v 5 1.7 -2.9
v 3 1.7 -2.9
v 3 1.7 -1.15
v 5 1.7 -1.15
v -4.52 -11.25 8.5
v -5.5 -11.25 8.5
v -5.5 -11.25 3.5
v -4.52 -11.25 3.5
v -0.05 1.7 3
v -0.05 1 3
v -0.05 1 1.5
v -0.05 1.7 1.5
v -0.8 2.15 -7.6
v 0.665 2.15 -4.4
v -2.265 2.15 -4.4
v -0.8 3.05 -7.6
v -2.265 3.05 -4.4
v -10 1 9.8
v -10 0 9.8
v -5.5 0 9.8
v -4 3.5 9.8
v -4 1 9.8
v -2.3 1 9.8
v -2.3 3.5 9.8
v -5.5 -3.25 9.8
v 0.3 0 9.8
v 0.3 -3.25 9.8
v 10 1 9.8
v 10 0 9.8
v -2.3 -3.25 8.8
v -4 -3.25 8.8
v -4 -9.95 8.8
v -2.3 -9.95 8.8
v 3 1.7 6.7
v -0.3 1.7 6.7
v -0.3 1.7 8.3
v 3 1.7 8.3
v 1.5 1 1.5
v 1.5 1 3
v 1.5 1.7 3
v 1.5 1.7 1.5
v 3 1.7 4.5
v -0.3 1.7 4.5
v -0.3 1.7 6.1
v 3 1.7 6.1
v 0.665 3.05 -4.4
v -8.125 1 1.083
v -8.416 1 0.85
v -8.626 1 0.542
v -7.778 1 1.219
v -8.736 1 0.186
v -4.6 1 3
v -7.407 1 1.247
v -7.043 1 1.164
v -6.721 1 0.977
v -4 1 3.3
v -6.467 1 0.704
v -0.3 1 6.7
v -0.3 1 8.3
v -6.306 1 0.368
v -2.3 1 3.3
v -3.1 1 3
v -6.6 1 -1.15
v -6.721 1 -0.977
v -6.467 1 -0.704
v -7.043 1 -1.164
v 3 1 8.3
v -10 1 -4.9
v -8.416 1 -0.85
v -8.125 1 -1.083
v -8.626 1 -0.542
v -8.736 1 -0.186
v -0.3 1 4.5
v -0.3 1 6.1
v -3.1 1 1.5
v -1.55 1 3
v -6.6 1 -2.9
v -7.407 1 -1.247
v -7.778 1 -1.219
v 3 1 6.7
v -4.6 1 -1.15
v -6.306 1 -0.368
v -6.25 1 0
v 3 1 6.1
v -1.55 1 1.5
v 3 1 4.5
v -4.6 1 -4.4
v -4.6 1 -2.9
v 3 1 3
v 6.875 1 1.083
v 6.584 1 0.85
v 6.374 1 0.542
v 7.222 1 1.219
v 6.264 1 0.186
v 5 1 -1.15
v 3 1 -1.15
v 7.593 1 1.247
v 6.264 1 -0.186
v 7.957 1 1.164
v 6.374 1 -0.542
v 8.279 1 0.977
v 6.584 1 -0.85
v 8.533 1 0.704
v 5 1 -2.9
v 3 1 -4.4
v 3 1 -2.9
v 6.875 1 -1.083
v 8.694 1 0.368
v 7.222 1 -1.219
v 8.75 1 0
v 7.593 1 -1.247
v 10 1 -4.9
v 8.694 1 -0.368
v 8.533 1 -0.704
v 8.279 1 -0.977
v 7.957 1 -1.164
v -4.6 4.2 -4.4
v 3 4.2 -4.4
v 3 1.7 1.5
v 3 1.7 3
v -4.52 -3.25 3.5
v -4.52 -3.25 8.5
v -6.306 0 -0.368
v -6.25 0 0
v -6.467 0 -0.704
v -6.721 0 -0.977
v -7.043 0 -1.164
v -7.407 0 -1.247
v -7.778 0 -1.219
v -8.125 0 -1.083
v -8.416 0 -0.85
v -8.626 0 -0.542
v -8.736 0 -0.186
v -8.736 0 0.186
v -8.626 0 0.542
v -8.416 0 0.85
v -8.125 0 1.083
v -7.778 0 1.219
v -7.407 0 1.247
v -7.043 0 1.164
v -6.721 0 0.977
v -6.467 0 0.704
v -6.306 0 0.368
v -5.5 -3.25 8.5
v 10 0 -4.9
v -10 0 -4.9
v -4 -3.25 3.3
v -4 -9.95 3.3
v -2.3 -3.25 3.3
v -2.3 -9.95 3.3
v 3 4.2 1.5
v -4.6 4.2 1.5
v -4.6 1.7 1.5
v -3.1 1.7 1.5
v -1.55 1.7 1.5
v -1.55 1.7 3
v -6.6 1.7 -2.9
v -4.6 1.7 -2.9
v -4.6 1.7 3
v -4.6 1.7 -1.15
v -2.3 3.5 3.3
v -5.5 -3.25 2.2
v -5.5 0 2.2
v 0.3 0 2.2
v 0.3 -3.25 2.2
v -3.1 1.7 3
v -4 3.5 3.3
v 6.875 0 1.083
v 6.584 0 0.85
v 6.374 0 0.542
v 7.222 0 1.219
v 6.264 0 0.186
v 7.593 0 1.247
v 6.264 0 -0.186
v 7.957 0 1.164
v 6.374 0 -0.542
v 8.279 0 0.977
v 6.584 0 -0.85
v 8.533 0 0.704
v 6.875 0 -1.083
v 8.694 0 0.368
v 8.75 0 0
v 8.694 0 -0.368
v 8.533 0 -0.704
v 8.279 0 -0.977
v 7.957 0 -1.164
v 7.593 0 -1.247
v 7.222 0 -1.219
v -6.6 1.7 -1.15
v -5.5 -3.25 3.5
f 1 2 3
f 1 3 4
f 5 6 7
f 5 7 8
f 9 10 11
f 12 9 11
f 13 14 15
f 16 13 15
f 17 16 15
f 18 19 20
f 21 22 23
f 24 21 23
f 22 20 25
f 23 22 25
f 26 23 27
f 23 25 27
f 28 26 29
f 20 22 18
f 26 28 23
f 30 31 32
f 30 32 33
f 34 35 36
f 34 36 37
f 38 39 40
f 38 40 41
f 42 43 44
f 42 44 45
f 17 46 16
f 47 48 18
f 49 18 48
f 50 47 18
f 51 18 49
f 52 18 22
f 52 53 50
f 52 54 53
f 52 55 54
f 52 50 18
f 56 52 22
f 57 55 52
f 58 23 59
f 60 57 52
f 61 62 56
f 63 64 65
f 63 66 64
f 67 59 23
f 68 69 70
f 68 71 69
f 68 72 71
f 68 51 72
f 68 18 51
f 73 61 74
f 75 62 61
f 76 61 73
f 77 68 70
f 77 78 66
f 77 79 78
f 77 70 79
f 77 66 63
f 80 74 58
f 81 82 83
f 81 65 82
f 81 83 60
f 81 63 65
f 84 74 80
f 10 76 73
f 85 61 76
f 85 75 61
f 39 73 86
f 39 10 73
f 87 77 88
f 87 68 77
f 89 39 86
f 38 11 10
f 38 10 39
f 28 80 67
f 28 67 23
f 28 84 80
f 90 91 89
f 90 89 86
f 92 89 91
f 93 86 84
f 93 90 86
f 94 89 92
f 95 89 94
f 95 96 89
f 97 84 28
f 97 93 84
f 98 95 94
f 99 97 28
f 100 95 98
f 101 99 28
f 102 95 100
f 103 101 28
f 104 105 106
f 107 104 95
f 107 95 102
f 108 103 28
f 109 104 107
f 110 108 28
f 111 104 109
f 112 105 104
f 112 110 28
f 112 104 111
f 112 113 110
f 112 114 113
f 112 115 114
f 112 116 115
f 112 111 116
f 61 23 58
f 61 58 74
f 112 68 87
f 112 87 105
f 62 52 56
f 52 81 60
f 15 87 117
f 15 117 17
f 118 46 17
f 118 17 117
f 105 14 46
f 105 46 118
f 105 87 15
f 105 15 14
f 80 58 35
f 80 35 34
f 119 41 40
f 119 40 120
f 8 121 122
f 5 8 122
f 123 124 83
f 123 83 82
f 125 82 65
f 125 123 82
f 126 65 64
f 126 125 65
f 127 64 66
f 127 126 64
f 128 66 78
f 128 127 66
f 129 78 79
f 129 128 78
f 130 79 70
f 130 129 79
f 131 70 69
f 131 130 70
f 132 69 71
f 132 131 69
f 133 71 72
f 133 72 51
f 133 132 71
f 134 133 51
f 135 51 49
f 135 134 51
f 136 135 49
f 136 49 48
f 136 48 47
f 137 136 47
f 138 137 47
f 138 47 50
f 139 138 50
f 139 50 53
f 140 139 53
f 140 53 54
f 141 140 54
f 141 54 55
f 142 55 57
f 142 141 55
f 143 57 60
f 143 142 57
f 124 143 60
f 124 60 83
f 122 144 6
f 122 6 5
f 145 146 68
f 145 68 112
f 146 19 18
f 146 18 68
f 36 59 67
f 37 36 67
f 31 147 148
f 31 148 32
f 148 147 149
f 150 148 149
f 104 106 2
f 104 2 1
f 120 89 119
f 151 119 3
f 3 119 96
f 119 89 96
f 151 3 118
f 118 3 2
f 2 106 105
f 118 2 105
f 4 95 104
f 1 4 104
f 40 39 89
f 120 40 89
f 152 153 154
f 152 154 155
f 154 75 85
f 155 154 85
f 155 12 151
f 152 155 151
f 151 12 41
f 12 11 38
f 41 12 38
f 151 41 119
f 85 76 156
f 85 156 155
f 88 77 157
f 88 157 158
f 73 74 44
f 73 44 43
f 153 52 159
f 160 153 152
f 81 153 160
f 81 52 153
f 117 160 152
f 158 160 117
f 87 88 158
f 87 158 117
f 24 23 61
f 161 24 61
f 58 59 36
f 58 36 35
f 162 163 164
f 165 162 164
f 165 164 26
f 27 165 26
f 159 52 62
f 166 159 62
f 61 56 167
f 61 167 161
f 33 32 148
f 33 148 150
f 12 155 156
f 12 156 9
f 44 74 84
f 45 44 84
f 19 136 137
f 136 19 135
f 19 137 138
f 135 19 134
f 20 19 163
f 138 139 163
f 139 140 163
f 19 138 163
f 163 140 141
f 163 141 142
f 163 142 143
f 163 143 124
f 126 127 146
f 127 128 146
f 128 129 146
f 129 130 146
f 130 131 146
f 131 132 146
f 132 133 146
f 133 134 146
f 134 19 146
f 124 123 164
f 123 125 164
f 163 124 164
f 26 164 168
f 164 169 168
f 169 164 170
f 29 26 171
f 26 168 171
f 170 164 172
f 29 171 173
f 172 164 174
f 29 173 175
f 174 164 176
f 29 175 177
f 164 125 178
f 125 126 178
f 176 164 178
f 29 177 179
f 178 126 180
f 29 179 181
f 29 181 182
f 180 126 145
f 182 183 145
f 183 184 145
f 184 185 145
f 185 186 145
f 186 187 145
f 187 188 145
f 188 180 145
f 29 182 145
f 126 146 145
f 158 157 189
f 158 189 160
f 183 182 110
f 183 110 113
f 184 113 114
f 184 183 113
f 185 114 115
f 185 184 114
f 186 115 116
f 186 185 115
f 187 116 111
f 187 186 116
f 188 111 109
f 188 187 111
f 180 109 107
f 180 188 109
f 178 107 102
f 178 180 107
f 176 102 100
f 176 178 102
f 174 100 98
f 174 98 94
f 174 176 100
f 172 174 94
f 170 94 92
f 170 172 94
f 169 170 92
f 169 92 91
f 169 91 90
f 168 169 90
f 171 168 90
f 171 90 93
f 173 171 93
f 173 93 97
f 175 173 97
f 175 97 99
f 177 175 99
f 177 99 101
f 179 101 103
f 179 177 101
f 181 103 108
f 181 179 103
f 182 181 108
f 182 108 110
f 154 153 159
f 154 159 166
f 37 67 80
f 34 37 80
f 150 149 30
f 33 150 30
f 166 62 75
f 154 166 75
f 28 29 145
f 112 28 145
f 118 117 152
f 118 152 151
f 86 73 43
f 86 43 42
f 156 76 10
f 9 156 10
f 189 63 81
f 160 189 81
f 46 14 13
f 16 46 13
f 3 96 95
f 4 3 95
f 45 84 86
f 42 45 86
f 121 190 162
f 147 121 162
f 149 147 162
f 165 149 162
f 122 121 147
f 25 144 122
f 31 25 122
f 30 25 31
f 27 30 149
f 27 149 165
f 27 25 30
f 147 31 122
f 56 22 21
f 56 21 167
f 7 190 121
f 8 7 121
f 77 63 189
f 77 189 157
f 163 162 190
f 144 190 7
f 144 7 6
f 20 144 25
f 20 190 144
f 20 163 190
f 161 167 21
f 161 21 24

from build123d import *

# Parameters (mm, degrees)
SKETCH_1_W          = 20
SKETCH_1_H          = 14.7
SKETCH_1_R          = 1.25
EXTRUDE_1_DEPTH     = 1
SKETCH_2_W          = 7.6
SKETCH_2_H          = 5.9
EXTRUDE_2_DEPTH     = 3.2
SKETCH_3_W          = 2.93
SKETCH_3_H          = 0.9
EXTRUDE_3_DEPTH     = 3.2
CUT_EXTRUDE_START   = -0.9
CUT_EXTRUDE_1_DEPTH = 0.9
SKETCH_5_W          = 2
SKETCH_5_H          = 1.75
SKETCH_5_W_2        = 1.5
SKETCH_5_H_2        = 1.5
SKETCH_5_W_3        = 3.3
SKETCH_5_H_3        = 1.6
EXTRUDE_4_DEPTH     = 0.7
SKETCH_6_W          = 1.7
SKETCH_6_H          = 6.5
EXTRUDE_5_DEPTH     = 2.5
SKETCH_7_W          = 5.8
SKETCH_7_H          = 7.6
EXTRUDE_6_DEPTH     = 3.25
SKETCH_8_W          = 0.98
SKETCH_8_H          = 5
EXTRUDE_7_DEPTH     = 8
SKETCH_9_W          = 1.7
SKETCH_9_H          = 5.5
EXTRUDE_8_DEPTH     = 6.7


with BuildPart() as part:
    # 草图1 → 凸台-拉伸1 (new body)
    with BuildSketch(Plane(origin=(0, 0, 0), x_dir=(1, 0, 0), z_dir=(0, 1, 0))):
        with Locations((0, -2.45)):
            Rectangle(SKETCH_1_W, SKETCH_1_H)
        with Locations((-7.5, 0)):
            Circle(SKETCH_1_R, mode=Mode.SUBTRACT)
        with Locations((7.5, 0)):
            Circle(SKETCH_1_R, mode=Mode.SUBTRACT)
    extrude(amount=EXTRUDE_1_DEPTH)

    # 草图2 → 凸台-拉伸2 (add)
    with BuildSketch(Plane(origin=(0, 1, 0), x_dir=(1, 0, 0), z_dir=(0, 1, 0))):
        with Locations((-0.8, 1.45)):
            Rectangle(SKETCH_2_W, SKETCH_2_H)
    extrude(amount=EXTRUDE_2_DEPTH)

    # 草图3 → 凸台-拉伸3 (add)
    with BuildSketch(Plane(origin=(0, 0, -4.4), x_dir=(-1, 0, 0), z_dir=(0, 0, -1))):
        with Locations((0.8, 2.6)):
            Rectangle(SKETCH_3_W, SKETCH_3_H)
    extrude(amount=EXTRUDE_3_DEPTH)

    # 草图4 → 切除-拉伸1 (cut)
    with BuildSketch(Plane(origin=(0, 3.05, 0), x_dir=(1, 0, 0), z_dir=(0, 1, 0)).offset(CUT_EXTRUDE_START)):
        Polygon((-0.8, 7.6), (-2.265, 4.4), (-2.265, 7.6), (-2.265, 7.984995913), (0.665, 7.984995913), (0.665, 7.6), (0.665, 4.4), align=None)
    extrude(amount=CUT_EXTRUDE_1_DEPTH, mode=Mode.SUBTRACT)

    # 草图5 → 凸台-拉伸4 (add)
    with BuildSketch(Plane(origin=(0, 1, 0), x_dir=(1, 0, 0), z_dir=(0, 1, 0))):
        with Locations((4, 2.025)):
            Rectangle(SKETCH_5_W, SKETCH_5_H)
        with Locations((-5.6, 2.025)):
            Rectangle(SKETCH_5_W, SKETCH_5_H)
        with Locations((-3.85, -2.25)):
            Rectangle(SKETCH_5_W_2, SKETCH_5_H_2)
        with Locations((-0.8, -2.25)):
            Rectangle(SKETCH_5_W_2, SKETCH_5_H_2)
        with Locations((2.25, -2.25)):
            Rectangle(SKETCH_5_W_2, SKETCH_5_H_2)
        with Locations((1.35, -5.3)):
            Rectangle(SKETCH_5_W_3, SKETCH_5_H_3)
        with Locations((1.35, -7.5)):
            Rectangle(SKETCH_5_W_3, SKETCH_5_H_3)
    extrude(amount=EXTRUDE_4_DEPTH)

    # 草图6 → 凸台-拉伸5 (add)
    with BuildSketch(Plane(origin=(0, 1, 0), x_dir=(1, 0, 0), z_dir=(0, 1, 0))):
        with Locations((-3.15, -6.55)):
            Rectangle(SKETCH_6_W, SKETCH_6_H)
    extrude(amount=EXTRUDE_5_DEPTH)

    # 草图7 → 凸台-拉伸6 (add)
    with BuildSketch(Plane.XZ):
        with Locations((-2.6, 6)):
            Rectangle(SKETCH_7_W, SKETCH_7_H)
    extrude(amount=EXTRUDE_6_DEPTH)

    # 草图8 → 凸台-拉伸7 (add)
    with BuildSketch(Plane.XZ.offset(3.25)):
        with Locations((-5.01, 6)):
            Rectangle(SKETCH_8_W, SKETCH_8_H)
    extrude(amount=EXTRUDE_7_DEPTH)

    # 草图9 → 凸台-拉伸8 (add)
    with BuildSketch(Plane.XZ.offset(3.25)):
        with Locations((-3.15, 6.05)):
            Rectangle(SKETCH_9_W, SKETCH_9_H)
    extrude(amount=EXTRUDE_8_DEPTH)


solid = part.part
